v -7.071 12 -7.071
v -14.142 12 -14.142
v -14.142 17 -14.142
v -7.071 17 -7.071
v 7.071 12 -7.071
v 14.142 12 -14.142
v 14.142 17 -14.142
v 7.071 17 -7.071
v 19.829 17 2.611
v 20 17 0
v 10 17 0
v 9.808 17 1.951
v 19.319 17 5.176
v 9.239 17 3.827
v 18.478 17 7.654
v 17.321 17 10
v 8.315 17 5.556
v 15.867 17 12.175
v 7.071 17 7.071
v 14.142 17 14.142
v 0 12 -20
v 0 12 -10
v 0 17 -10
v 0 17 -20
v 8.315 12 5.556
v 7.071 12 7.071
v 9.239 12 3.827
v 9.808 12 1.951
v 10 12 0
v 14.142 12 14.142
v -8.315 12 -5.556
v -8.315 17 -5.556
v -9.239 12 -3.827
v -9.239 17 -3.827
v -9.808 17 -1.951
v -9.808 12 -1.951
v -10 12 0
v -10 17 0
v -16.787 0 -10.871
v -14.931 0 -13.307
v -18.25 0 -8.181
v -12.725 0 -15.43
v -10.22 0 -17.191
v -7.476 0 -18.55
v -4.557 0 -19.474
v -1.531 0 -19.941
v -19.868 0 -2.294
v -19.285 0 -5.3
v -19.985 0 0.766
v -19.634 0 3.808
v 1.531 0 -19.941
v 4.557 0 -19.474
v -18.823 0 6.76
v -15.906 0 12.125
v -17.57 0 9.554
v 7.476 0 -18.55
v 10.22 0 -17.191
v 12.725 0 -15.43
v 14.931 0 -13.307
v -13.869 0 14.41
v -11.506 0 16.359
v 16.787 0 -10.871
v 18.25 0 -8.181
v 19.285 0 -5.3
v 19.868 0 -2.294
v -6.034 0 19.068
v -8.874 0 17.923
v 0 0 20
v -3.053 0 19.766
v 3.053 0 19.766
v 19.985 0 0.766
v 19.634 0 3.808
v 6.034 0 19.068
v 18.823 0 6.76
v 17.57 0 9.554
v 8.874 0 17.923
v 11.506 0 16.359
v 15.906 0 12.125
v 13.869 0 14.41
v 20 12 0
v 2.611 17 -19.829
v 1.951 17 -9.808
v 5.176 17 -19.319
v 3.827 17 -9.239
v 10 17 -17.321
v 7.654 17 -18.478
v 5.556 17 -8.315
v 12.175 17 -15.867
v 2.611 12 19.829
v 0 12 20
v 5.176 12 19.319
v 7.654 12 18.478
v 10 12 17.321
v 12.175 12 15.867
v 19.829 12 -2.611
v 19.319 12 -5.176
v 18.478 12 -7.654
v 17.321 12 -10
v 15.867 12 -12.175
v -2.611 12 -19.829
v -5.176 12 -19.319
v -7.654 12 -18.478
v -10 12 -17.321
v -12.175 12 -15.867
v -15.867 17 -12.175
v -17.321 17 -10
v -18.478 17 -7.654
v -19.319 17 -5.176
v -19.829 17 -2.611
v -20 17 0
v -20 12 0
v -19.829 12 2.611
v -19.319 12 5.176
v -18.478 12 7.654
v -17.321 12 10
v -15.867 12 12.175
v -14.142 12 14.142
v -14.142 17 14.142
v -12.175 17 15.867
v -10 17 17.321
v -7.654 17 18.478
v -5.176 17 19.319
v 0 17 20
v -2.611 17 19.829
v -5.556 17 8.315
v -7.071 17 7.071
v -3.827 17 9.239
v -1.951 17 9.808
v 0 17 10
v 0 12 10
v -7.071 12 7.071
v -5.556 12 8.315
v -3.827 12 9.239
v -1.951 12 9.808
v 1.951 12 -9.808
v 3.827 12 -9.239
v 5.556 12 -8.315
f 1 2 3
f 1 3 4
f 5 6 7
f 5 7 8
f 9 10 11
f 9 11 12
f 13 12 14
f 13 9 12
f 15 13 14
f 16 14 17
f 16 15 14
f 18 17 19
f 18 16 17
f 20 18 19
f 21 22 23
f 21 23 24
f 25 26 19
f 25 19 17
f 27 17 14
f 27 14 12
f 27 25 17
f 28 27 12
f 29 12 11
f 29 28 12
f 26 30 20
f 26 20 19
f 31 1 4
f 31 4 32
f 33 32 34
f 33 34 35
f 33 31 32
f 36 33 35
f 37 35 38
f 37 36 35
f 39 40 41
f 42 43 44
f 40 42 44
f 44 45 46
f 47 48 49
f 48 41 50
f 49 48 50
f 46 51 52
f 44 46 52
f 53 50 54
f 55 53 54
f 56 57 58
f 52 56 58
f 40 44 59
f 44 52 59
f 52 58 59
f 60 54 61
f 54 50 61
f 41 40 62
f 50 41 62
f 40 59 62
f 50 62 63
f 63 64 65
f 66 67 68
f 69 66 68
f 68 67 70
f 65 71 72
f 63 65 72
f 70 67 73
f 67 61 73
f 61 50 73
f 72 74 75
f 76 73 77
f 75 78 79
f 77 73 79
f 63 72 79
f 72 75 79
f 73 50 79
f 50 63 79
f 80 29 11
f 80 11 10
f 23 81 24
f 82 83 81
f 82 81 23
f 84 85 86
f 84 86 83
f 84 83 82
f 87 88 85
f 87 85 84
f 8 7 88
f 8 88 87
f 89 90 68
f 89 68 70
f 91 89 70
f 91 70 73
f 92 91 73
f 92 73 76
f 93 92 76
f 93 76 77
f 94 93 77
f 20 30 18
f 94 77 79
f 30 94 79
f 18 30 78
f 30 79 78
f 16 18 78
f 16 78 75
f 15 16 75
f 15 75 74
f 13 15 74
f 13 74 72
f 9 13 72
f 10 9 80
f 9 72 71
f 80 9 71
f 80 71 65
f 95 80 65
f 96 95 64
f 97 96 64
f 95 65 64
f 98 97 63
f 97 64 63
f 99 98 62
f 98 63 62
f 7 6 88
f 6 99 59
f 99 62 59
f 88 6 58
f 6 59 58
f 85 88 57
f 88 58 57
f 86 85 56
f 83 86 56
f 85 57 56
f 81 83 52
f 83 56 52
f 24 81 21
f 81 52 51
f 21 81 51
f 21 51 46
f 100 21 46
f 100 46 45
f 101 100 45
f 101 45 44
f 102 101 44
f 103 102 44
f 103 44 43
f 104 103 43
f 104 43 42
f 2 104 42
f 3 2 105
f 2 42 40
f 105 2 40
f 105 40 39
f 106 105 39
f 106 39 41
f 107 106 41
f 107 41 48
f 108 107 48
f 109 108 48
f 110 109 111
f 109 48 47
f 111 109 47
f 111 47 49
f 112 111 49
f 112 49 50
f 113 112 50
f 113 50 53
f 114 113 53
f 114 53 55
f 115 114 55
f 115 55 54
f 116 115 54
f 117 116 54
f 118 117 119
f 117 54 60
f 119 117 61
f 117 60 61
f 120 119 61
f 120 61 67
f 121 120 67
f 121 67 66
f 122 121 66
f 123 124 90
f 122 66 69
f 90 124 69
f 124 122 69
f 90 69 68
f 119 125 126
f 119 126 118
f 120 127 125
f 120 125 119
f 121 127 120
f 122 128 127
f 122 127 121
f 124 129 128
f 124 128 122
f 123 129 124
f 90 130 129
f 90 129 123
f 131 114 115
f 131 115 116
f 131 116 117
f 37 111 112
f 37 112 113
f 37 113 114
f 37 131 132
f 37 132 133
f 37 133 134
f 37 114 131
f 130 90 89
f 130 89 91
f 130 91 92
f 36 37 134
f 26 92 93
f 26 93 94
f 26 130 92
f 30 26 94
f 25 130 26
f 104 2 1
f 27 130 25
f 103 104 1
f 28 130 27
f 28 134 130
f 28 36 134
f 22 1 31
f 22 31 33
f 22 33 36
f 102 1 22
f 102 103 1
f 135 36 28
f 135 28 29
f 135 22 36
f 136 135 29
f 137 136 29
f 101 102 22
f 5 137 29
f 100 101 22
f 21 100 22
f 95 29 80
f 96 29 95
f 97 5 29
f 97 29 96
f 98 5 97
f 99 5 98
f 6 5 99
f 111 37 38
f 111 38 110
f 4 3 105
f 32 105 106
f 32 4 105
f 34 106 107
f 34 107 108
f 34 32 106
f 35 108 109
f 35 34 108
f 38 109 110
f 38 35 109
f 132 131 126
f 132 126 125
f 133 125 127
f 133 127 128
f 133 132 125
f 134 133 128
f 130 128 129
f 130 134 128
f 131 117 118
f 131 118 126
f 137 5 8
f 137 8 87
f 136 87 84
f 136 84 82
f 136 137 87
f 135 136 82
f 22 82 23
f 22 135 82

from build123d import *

# Parameters (mm, degrees)
SKETCH1_R                      = 20
EXTRUDE_MECHANISM_PART_1_DEPTH = 17
CUT_START                      = -5
CUT_MECHANISM_PART_1_DEPTH     = 5


with BuildPart() as part:
    # Sketch1 → Extrude (Mechanism Part 1) (new body)
    with BuildSketch(Plane(origin=(0, 0, 0), x_dir=(1, 0, 0), z_dir=(0, 1, 0))):
        with Locations(Location((0, 0, 0), (0, 0, 270))):
            Circle(SKETCH1_R)
    extrude(amount=EXTRUDE_MECHANISM_PART_1_DEPTH)

    # Sketch2 → Cut (Mechanism Part 1) (cut)
    with BuildSketch(Plane(origin=(0, 17, 0), x_dir=(1, 0, 0), z_dir=(0, 1, 0)).offset(CUT_START)):
        with BuildLine():
            Line((0, 10), (0, 20))
            ThreePointArc((0, 20), (-7.653668647, 18.47759065), (-14.142135624, 14.142135624))
            Line((-14.142135624, 14.142135624), (-7.071067812, 7.071067812))
            ThreePointArc((-7.071067812, 7.071067812), (-3.826834324, 9.238795325), (0, 10))
        make_face()
        with BuildLine():
            ThreePointArc((20, 0), (18.47759065, 7.653668647), (14.142135624, 14.142135624))
            Line((14.142135624, 14.142135624), (7.071067812, 7.071067812))
            ThreePointArc((7.071067812, 7.071067812), (9.238795325, 3.826834324), (10, 0))
            Line((10, 0), (20, 0))
        make_face()
        with BuildLine():
            ThreePointArc((7.071067812, -7.071067812), (3.826834324, -9.238795325), (0, -10))
            Line((0, -10), (0, -20))
            ThreePointArc((0, -20), (7.653668647, -18.47759065), (14.142135624, -14.142135624))
            Line((14.142135624, -14.142135624), (7.071067812, -7.071067812))
        make_face()
        with BuildLine():
            Line((-10, 0), (-20, 0))
            ThreePointArc((-20, 0), (-18.47759065, -7.653668647), (-14.142135624, -14.142135624))
            Line((-14.142135624, -14.142135624), (-7.071067812, -7.071067812))
            ThreePointArc((-7.071067812, -7.071067812), (-9.238795325, -3.826834324), (-10, 0))
        make_face()
        with BuildLine():
            Line((-7.071067812, -7.071067812), (0, 0))
            Line((0, 0), (-10, 0))
            ThreePointArc((-10, 0), (-9.238795325, -3.826834324), (-7.071067812, -7.071067812))
        make_face()
        with BuildLine():
            Line((-10, 0), (0, 0))
            Line((0, 0), (-7.071067812, 7.071067812))
            ThreePointArc((-7.071067812, 7.071067812), (-9.238795325, 3.826834324), (-10, 0))
        make_face()
        with BuildLine():
            Line((0, 0), (0, 10))
            ThreePointArc((0, 10), (-3.826834324, 9.238795325), (-7.071067812, 7.071067812))
            Line((-7.071067812, 7.071067812), (0, 0))
        make_face()
        with BuildLine():
            ThreePointArc((7.071067812, 7.071067812), (3.826834324, 9.238795325), (0, 10))
            Line((0, 10), (0, 0))
            Line((0, 0), (7.071067812, 7.071067812))
        make_face()
        with BuildLine():
            Line((7.071067812, 7.071067812), (0, 0))
            Line((0, 0), (10, 0))
            ThreePointArc((10, 0), (9.238795325, 3.826834324), (7.071067812, 7.071067812))
        make_face()
        with BuildLine():
            Line((10, 0), (0, 0))
            Line((0, 0), (7.071067812, -7.071067812))
            ThreePointArc((7.071067812, -7.071067812), (9.238795325, -3.826834324), (10, 0))
        make_face()
        with BuildLine():
            Line((7.071067812, -7.071067812), (0, 0))
            Line((0, 0), (0, -10))
            ThreePointArc((0, -10), (3.826834324, -9.238795325), (7.071067812, -7.071067812))
        make_face()
        with BuildLine():
            Line((0, -10), (0, 0))
            Line((0, 0), (-7.071067812, -7.071067812))
            ThreePointArc((-7.071067812, -7.071067812), (-3.826834324, -9.238795325), (0, -10))
        make_face()
    extrude(amount=CUT_MECHANISM_PART_1_DEPTH, mode=Mode.SUBTRACT)


solid = part.part
